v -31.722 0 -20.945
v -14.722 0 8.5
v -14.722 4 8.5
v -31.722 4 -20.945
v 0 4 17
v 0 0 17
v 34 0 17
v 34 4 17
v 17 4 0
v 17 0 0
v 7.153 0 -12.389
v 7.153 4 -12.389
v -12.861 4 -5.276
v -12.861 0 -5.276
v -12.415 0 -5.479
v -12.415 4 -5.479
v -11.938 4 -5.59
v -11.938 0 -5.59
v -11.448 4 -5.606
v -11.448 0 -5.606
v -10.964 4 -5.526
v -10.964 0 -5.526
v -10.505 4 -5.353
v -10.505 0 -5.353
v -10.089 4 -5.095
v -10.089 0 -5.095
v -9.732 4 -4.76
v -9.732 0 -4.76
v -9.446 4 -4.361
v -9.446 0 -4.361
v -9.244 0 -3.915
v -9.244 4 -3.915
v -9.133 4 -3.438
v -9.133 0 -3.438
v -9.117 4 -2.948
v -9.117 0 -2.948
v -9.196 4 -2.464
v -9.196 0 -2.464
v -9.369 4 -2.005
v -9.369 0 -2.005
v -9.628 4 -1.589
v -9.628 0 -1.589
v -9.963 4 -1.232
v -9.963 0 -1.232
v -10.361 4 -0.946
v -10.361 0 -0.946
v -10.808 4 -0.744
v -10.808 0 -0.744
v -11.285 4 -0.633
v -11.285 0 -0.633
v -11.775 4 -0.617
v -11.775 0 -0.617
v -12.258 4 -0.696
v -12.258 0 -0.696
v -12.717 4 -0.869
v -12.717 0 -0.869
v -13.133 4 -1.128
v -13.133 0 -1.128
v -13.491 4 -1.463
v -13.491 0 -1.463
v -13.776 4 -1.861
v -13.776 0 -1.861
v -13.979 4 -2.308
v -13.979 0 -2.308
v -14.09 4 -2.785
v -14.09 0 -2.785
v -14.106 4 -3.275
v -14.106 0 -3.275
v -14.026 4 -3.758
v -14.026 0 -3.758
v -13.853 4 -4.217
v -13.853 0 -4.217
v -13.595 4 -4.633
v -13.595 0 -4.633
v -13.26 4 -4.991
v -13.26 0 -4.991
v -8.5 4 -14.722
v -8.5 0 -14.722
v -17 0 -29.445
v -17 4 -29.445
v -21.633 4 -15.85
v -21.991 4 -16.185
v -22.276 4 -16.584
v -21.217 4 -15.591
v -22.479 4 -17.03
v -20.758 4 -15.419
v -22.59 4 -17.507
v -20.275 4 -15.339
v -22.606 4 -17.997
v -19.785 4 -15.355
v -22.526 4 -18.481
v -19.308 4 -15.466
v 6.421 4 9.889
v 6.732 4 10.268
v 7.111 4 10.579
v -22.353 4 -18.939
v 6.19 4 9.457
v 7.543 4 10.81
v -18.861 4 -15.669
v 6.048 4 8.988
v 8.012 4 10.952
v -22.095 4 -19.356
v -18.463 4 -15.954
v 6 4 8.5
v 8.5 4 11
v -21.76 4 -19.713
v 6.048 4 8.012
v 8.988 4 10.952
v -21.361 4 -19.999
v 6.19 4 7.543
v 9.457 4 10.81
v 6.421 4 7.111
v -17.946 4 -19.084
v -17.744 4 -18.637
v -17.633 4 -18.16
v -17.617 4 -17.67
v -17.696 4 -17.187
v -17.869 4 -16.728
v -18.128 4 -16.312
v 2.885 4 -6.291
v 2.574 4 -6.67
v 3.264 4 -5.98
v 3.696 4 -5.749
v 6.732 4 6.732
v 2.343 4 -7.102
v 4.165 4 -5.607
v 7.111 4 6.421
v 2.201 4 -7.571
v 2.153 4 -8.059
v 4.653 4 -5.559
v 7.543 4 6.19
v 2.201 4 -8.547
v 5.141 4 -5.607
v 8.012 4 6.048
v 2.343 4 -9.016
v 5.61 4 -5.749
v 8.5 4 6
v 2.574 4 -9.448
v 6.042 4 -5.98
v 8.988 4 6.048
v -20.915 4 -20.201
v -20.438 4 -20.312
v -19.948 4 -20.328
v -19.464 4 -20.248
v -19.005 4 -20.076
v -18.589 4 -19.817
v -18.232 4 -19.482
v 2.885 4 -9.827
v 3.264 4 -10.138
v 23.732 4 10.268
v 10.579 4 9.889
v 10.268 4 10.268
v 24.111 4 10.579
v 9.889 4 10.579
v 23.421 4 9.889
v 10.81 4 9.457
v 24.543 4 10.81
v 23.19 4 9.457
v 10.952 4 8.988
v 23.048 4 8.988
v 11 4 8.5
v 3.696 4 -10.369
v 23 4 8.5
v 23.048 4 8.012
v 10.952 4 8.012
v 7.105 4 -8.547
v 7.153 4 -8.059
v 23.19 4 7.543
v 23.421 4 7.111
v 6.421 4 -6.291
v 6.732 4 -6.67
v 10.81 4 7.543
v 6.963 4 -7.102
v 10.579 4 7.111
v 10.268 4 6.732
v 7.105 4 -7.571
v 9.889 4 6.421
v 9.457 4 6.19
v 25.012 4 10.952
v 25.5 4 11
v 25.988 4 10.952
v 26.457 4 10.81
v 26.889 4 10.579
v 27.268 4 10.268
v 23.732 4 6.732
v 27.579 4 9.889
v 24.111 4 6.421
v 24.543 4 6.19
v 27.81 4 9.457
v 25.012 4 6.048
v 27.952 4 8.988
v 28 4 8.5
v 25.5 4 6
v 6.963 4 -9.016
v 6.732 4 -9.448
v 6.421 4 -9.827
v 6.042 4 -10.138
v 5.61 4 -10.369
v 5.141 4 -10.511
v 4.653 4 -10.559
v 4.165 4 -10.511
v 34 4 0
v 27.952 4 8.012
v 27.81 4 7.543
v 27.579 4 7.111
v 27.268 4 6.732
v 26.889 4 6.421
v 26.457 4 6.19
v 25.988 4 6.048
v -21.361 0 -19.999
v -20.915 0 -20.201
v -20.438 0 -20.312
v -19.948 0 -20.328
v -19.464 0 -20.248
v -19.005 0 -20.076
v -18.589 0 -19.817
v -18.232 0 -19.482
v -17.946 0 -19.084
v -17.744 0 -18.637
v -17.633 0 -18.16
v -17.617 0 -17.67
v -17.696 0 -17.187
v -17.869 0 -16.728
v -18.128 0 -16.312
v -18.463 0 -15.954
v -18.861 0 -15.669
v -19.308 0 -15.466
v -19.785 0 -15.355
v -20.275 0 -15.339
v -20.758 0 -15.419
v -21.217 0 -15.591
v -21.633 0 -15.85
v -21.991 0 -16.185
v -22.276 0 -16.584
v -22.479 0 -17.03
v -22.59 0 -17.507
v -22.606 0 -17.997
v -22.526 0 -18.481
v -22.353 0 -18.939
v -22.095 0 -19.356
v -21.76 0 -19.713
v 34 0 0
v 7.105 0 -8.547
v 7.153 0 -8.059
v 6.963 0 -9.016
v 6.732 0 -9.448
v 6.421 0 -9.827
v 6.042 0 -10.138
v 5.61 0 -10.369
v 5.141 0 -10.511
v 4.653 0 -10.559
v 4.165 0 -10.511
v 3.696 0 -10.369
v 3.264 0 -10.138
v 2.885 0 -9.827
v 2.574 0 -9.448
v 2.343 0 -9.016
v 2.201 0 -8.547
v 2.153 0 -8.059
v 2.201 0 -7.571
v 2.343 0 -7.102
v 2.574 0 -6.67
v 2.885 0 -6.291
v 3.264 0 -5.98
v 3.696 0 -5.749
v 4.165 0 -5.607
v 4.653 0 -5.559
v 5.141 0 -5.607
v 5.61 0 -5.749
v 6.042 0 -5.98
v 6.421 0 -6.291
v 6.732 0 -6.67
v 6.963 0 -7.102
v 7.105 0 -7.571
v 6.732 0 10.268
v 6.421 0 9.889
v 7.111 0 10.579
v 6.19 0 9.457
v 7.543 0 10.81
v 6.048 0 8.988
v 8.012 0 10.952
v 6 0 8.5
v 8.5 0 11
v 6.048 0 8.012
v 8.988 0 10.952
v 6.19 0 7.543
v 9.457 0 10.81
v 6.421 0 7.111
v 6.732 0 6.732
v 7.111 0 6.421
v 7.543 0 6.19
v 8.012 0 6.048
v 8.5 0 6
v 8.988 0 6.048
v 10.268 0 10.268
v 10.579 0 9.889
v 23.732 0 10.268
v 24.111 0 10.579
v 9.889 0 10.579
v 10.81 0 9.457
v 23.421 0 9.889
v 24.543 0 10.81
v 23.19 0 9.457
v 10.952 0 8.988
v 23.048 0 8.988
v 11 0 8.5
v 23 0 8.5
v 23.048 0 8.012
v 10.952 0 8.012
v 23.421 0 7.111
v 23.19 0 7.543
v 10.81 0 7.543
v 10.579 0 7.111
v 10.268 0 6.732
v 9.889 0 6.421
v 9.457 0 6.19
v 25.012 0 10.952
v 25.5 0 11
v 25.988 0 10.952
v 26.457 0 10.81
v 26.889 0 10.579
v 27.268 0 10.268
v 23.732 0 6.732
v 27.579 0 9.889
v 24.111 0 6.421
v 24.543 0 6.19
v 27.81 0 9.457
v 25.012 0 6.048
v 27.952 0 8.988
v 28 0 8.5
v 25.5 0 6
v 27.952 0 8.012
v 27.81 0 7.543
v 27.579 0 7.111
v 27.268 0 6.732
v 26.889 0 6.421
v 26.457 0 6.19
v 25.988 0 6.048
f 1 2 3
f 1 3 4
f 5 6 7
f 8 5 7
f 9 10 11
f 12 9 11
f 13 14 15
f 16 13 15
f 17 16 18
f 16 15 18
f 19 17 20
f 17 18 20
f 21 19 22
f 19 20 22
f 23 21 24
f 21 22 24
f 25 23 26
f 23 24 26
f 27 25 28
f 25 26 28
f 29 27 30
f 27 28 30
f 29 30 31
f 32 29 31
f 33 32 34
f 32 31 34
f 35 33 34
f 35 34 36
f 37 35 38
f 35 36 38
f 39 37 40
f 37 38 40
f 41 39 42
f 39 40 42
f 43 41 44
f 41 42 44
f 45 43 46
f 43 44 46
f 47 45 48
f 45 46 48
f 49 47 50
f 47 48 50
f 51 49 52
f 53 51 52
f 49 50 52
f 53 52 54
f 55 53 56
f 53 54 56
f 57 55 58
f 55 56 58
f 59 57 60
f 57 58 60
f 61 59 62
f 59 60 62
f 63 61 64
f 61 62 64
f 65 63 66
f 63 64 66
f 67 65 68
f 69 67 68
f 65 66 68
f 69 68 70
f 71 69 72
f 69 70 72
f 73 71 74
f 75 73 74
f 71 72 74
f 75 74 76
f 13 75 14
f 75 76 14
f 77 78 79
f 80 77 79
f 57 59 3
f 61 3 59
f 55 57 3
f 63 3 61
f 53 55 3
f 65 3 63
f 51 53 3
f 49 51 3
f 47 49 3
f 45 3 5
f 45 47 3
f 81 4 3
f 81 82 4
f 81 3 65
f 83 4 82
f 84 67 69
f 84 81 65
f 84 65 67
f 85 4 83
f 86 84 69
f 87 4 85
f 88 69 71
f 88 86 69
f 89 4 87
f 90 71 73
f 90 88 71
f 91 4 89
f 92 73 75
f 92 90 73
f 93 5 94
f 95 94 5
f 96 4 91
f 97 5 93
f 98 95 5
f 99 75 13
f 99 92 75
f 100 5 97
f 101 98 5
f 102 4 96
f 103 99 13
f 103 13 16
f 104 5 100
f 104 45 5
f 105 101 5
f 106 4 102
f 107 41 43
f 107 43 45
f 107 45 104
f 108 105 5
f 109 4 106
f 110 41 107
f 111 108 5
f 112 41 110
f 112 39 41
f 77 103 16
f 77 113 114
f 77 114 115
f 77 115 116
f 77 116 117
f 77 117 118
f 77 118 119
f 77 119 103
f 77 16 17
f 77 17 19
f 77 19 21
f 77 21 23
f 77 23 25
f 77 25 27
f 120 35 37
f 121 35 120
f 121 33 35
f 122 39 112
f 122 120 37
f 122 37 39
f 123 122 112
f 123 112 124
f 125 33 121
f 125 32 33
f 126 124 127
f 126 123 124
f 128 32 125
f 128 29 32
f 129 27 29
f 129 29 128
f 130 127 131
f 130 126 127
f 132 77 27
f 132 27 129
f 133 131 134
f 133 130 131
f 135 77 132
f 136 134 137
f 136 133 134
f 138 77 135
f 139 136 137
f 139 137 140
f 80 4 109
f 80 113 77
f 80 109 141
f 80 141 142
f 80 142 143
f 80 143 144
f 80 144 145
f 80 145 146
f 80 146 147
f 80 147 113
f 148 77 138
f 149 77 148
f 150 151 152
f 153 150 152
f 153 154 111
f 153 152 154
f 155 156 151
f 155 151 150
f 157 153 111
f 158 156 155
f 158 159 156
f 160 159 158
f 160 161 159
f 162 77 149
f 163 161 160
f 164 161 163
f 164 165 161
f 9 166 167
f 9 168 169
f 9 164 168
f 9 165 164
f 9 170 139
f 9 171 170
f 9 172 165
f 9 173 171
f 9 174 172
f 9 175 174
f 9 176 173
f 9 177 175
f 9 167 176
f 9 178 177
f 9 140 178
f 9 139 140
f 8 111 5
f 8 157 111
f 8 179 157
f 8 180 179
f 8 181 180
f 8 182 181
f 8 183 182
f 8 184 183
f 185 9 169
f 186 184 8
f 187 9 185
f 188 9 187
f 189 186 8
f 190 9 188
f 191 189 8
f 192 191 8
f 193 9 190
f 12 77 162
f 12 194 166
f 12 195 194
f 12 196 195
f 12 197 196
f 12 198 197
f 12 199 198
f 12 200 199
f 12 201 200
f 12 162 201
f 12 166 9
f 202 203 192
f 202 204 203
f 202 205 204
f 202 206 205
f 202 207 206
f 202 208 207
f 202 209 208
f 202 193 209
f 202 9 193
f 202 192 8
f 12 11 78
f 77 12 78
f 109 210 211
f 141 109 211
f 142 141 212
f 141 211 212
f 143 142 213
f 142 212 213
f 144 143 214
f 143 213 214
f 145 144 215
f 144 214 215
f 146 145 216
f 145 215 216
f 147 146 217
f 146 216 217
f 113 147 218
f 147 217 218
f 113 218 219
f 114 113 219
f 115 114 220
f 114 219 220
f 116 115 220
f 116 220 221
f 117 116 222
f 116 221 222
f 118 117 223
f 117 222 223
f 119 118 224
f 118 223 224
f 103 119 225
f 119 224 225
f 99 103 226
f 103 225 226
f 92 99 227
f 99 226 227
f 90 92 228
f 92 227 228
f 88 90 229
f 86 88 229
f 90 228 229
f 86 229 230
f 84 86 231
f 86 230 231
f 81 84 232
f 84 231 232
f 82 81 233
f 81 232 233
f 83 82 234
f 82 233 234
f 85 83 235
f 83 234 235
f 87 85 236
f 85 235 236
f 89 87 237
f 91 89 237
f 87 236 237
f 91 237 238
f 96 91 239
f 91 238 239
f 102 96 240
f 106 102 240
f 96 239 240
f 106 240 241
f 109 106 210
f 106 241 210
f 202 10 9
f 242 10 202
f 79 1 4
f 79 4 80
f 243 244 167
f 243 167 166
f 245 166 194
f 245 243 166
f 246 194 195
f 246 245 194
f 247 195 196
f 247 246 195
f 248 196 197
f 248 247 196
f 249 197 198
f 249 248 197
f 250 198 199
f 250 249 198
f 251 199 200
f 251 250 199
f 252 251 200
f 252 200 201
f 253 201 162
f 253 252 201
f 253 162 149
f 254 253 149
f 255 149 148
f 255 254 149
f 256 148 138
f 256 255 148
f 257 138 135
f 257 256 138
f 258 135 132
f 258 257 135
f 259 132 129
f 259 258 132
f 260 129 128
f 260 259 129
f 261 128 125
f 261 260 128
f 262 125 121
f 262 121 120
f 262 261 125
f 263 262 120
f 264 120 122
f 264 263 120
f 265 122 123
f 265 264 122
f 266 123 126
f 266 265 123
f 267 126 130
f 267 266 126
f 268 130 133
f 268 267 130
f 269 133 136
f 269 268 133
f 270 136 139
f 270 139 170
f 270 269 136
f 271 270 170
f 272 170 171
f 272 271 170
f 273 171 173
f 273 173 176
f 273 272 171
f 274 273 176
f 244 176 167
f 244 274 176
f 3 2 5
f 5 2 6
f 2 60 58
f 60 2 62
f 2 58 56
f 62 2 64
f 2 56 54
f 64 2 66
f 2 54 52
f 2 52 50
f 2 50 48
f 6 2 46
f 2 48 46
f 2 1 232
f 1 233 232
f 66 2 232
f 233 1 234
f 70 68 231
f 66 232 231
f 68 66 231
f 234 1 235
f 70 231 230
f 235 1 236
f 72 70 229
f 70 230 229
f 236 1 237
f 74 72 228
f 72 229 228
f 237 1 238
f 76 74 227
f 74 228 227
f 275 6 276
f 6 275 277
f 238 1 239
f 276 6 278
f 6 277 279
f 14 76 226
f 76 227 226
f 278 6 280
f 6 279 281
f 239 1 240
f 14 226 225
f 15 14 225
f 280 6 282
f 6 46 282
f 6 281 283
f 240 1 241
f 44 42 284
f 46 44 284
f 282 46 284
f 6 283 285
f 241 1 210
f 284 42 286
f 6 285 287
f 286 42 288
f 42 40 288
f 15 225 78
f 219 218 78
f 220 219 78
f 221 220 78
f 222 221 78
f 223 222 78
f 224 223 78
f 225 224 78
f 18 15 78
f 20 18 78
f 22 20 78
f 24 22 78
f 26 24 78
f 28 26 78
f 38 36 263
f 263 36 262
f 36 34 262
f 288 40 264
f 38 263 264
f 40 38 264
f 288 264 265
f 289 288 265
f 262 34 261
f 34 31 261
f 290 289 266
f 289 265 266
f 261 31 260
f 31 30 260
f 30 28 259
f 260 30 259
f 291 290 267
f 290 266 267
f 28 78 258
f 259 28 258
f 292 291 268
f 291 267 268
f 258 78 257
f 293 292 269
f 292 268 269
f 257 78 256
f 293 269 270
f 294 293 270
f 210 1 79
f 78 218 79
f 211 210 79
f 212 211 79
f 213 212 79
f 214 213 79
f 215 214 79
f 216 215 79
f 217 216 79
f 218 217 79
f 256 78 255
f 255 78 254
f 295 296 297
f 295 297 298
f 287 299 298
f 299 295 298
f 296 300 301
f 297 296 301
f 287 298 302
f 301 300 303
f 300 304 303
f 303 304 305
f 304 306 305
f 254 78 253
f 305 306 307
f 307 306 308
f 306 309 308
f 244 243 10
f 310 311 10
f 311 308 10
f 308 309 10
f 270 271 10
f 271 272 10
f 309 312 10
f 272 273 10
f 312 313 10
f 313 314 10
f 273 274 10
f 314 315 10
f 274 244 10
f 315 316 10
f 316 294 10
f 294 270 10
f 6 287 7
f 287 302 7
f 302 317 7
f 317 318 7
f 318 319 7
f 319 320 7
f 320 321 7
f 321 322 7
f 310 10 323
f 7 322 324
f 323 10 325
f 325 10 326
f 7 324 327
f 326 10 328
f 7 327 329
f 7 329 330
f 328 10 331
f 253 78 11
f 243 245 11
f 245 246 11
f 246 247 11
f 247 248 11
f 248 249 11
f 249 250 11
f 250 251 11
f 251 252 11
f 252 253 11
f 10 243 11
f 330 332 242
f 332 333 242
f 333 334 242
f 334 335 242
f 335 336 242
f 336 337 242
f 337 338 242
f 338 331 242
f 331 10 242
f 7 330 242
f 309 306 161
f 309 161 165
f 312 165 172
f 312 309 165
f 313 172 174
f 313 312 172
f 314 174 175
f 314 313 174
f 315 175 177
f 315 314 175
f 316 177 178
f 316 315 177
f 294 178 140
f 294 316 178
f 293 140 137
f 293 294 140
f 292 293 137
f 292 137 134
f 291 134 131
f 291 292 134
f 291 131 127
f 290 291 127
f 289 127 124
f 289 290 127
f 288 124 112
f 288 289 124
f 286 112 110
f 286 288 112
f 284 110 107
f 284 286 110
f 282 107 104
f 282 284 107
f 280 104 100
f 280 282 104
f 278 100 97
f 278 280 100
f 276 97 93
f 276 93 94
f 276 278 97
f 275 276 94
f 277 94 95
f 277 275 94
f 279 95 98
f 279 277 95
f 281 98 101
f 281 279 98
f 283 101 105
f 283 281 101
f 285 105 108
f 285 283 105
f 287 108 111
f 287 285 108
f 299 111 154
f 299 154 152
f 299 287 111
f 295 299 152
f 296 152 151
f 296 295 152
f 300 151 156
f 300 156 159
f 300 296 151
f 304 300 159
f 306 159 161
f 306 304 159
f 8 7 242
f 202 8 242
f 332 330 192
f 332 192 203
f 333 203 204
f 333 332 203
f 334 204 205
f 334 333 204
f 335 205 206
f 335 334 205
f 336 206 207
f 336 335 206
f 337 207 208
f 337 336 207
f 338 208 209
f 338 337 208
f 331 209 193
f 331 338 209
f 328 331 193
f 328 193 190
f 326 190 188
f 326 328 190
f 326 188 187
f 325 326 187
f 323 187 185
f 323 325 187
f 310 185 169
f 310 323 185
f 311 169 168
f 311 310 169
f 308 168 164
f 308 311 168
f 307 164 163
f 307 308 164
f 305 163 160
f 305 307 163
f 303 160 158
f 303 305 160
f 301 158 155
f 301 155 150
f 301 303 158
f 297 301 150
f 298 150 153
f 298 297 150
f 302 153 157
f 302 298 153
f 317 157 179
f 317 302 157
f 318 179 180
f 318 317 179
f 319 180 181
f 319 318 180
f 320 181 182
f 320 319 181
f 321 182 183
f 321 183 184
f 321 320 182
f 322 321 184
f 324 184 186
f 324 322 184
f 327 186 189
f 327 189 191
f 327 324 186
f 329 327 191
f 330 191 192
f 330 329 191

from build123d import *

# Parameters (mm, degrees)
SKETCH1_W           = 34
SKETCH1_H           = 17
SKETCH1_R           = 2.5
BOSS_EXTRUDE1_DEPTH = 4
BOSS_EXTRUDE2_DEPTH = 4
SKETCH13_R          = 2.5
BOSS_EXTRUDE3_DEPTH = 4


with BuildPart() as part:
    # sketch1 → Boss-Extrude1 (new body)
    with BuildSketch(Plane(origin=(0, 0, 0), x_dir=(1, 0, 0), z_dir=(0, 1, 0))):
        with Locations((17, -8.5)):
            Rectangle(SKETCH1_W, SKETCH1_H)
        with Locations((8.5, -8.5)):
            Circle(SKETCH1_R, mode=Mode.SUBTRACT)
        with Locations((25.5, -8.5)):
            Circle(SKETCH1_R, mode=Mode.SUBTRACT)
    extrude(amount=BOSS_EXTRUDE1_DEPTH)


with BuildPart() as body_2:
    # Mirror6: mirrored copy
    add(part.part.mirror(Plane(origin=(0, 0, 0), x_dir=(-0.5, 0, 0.866025404), z_dir=(-0.866025404, 0, -0.5))))


with BuildPart() as part_1:
    add(part.part)

    add(body_2.part)  # Boss-Extrude2 merges body 2
    # Sketch11 → Boss-Extrude2 (add)
    with BuildSketch(Plane(origin=(0, 0, 0), x_dir=(1, 0, 0), z_dir=(0, 1, 0))):
        Polygon((-14.722431864, -8.5), (0, -17), (0, 0), align=None)
    extrude(amount=BOSS_EXTRUDE2_DEPTH)

    # Sketch13 → Boss-Extrude3 (add)
    with BuildSketch(Plane(origin=(0, 0, 0), x_dir=(1, 0, 0), z_dir=(0, 1, 0))):
        Polygon((7.152847248, 12.389094852), (-8.5, 14.722431864), (0, 0), (17, 0), align=None)
        with Locations((4.652847248, 8.058967833)):
            Circle(SKETCH13_R, mode=Mode.SUBTRACT)
    extrude(amount=BOSS_EXTRUDE3_DEPTH)


solid = part_1.part
